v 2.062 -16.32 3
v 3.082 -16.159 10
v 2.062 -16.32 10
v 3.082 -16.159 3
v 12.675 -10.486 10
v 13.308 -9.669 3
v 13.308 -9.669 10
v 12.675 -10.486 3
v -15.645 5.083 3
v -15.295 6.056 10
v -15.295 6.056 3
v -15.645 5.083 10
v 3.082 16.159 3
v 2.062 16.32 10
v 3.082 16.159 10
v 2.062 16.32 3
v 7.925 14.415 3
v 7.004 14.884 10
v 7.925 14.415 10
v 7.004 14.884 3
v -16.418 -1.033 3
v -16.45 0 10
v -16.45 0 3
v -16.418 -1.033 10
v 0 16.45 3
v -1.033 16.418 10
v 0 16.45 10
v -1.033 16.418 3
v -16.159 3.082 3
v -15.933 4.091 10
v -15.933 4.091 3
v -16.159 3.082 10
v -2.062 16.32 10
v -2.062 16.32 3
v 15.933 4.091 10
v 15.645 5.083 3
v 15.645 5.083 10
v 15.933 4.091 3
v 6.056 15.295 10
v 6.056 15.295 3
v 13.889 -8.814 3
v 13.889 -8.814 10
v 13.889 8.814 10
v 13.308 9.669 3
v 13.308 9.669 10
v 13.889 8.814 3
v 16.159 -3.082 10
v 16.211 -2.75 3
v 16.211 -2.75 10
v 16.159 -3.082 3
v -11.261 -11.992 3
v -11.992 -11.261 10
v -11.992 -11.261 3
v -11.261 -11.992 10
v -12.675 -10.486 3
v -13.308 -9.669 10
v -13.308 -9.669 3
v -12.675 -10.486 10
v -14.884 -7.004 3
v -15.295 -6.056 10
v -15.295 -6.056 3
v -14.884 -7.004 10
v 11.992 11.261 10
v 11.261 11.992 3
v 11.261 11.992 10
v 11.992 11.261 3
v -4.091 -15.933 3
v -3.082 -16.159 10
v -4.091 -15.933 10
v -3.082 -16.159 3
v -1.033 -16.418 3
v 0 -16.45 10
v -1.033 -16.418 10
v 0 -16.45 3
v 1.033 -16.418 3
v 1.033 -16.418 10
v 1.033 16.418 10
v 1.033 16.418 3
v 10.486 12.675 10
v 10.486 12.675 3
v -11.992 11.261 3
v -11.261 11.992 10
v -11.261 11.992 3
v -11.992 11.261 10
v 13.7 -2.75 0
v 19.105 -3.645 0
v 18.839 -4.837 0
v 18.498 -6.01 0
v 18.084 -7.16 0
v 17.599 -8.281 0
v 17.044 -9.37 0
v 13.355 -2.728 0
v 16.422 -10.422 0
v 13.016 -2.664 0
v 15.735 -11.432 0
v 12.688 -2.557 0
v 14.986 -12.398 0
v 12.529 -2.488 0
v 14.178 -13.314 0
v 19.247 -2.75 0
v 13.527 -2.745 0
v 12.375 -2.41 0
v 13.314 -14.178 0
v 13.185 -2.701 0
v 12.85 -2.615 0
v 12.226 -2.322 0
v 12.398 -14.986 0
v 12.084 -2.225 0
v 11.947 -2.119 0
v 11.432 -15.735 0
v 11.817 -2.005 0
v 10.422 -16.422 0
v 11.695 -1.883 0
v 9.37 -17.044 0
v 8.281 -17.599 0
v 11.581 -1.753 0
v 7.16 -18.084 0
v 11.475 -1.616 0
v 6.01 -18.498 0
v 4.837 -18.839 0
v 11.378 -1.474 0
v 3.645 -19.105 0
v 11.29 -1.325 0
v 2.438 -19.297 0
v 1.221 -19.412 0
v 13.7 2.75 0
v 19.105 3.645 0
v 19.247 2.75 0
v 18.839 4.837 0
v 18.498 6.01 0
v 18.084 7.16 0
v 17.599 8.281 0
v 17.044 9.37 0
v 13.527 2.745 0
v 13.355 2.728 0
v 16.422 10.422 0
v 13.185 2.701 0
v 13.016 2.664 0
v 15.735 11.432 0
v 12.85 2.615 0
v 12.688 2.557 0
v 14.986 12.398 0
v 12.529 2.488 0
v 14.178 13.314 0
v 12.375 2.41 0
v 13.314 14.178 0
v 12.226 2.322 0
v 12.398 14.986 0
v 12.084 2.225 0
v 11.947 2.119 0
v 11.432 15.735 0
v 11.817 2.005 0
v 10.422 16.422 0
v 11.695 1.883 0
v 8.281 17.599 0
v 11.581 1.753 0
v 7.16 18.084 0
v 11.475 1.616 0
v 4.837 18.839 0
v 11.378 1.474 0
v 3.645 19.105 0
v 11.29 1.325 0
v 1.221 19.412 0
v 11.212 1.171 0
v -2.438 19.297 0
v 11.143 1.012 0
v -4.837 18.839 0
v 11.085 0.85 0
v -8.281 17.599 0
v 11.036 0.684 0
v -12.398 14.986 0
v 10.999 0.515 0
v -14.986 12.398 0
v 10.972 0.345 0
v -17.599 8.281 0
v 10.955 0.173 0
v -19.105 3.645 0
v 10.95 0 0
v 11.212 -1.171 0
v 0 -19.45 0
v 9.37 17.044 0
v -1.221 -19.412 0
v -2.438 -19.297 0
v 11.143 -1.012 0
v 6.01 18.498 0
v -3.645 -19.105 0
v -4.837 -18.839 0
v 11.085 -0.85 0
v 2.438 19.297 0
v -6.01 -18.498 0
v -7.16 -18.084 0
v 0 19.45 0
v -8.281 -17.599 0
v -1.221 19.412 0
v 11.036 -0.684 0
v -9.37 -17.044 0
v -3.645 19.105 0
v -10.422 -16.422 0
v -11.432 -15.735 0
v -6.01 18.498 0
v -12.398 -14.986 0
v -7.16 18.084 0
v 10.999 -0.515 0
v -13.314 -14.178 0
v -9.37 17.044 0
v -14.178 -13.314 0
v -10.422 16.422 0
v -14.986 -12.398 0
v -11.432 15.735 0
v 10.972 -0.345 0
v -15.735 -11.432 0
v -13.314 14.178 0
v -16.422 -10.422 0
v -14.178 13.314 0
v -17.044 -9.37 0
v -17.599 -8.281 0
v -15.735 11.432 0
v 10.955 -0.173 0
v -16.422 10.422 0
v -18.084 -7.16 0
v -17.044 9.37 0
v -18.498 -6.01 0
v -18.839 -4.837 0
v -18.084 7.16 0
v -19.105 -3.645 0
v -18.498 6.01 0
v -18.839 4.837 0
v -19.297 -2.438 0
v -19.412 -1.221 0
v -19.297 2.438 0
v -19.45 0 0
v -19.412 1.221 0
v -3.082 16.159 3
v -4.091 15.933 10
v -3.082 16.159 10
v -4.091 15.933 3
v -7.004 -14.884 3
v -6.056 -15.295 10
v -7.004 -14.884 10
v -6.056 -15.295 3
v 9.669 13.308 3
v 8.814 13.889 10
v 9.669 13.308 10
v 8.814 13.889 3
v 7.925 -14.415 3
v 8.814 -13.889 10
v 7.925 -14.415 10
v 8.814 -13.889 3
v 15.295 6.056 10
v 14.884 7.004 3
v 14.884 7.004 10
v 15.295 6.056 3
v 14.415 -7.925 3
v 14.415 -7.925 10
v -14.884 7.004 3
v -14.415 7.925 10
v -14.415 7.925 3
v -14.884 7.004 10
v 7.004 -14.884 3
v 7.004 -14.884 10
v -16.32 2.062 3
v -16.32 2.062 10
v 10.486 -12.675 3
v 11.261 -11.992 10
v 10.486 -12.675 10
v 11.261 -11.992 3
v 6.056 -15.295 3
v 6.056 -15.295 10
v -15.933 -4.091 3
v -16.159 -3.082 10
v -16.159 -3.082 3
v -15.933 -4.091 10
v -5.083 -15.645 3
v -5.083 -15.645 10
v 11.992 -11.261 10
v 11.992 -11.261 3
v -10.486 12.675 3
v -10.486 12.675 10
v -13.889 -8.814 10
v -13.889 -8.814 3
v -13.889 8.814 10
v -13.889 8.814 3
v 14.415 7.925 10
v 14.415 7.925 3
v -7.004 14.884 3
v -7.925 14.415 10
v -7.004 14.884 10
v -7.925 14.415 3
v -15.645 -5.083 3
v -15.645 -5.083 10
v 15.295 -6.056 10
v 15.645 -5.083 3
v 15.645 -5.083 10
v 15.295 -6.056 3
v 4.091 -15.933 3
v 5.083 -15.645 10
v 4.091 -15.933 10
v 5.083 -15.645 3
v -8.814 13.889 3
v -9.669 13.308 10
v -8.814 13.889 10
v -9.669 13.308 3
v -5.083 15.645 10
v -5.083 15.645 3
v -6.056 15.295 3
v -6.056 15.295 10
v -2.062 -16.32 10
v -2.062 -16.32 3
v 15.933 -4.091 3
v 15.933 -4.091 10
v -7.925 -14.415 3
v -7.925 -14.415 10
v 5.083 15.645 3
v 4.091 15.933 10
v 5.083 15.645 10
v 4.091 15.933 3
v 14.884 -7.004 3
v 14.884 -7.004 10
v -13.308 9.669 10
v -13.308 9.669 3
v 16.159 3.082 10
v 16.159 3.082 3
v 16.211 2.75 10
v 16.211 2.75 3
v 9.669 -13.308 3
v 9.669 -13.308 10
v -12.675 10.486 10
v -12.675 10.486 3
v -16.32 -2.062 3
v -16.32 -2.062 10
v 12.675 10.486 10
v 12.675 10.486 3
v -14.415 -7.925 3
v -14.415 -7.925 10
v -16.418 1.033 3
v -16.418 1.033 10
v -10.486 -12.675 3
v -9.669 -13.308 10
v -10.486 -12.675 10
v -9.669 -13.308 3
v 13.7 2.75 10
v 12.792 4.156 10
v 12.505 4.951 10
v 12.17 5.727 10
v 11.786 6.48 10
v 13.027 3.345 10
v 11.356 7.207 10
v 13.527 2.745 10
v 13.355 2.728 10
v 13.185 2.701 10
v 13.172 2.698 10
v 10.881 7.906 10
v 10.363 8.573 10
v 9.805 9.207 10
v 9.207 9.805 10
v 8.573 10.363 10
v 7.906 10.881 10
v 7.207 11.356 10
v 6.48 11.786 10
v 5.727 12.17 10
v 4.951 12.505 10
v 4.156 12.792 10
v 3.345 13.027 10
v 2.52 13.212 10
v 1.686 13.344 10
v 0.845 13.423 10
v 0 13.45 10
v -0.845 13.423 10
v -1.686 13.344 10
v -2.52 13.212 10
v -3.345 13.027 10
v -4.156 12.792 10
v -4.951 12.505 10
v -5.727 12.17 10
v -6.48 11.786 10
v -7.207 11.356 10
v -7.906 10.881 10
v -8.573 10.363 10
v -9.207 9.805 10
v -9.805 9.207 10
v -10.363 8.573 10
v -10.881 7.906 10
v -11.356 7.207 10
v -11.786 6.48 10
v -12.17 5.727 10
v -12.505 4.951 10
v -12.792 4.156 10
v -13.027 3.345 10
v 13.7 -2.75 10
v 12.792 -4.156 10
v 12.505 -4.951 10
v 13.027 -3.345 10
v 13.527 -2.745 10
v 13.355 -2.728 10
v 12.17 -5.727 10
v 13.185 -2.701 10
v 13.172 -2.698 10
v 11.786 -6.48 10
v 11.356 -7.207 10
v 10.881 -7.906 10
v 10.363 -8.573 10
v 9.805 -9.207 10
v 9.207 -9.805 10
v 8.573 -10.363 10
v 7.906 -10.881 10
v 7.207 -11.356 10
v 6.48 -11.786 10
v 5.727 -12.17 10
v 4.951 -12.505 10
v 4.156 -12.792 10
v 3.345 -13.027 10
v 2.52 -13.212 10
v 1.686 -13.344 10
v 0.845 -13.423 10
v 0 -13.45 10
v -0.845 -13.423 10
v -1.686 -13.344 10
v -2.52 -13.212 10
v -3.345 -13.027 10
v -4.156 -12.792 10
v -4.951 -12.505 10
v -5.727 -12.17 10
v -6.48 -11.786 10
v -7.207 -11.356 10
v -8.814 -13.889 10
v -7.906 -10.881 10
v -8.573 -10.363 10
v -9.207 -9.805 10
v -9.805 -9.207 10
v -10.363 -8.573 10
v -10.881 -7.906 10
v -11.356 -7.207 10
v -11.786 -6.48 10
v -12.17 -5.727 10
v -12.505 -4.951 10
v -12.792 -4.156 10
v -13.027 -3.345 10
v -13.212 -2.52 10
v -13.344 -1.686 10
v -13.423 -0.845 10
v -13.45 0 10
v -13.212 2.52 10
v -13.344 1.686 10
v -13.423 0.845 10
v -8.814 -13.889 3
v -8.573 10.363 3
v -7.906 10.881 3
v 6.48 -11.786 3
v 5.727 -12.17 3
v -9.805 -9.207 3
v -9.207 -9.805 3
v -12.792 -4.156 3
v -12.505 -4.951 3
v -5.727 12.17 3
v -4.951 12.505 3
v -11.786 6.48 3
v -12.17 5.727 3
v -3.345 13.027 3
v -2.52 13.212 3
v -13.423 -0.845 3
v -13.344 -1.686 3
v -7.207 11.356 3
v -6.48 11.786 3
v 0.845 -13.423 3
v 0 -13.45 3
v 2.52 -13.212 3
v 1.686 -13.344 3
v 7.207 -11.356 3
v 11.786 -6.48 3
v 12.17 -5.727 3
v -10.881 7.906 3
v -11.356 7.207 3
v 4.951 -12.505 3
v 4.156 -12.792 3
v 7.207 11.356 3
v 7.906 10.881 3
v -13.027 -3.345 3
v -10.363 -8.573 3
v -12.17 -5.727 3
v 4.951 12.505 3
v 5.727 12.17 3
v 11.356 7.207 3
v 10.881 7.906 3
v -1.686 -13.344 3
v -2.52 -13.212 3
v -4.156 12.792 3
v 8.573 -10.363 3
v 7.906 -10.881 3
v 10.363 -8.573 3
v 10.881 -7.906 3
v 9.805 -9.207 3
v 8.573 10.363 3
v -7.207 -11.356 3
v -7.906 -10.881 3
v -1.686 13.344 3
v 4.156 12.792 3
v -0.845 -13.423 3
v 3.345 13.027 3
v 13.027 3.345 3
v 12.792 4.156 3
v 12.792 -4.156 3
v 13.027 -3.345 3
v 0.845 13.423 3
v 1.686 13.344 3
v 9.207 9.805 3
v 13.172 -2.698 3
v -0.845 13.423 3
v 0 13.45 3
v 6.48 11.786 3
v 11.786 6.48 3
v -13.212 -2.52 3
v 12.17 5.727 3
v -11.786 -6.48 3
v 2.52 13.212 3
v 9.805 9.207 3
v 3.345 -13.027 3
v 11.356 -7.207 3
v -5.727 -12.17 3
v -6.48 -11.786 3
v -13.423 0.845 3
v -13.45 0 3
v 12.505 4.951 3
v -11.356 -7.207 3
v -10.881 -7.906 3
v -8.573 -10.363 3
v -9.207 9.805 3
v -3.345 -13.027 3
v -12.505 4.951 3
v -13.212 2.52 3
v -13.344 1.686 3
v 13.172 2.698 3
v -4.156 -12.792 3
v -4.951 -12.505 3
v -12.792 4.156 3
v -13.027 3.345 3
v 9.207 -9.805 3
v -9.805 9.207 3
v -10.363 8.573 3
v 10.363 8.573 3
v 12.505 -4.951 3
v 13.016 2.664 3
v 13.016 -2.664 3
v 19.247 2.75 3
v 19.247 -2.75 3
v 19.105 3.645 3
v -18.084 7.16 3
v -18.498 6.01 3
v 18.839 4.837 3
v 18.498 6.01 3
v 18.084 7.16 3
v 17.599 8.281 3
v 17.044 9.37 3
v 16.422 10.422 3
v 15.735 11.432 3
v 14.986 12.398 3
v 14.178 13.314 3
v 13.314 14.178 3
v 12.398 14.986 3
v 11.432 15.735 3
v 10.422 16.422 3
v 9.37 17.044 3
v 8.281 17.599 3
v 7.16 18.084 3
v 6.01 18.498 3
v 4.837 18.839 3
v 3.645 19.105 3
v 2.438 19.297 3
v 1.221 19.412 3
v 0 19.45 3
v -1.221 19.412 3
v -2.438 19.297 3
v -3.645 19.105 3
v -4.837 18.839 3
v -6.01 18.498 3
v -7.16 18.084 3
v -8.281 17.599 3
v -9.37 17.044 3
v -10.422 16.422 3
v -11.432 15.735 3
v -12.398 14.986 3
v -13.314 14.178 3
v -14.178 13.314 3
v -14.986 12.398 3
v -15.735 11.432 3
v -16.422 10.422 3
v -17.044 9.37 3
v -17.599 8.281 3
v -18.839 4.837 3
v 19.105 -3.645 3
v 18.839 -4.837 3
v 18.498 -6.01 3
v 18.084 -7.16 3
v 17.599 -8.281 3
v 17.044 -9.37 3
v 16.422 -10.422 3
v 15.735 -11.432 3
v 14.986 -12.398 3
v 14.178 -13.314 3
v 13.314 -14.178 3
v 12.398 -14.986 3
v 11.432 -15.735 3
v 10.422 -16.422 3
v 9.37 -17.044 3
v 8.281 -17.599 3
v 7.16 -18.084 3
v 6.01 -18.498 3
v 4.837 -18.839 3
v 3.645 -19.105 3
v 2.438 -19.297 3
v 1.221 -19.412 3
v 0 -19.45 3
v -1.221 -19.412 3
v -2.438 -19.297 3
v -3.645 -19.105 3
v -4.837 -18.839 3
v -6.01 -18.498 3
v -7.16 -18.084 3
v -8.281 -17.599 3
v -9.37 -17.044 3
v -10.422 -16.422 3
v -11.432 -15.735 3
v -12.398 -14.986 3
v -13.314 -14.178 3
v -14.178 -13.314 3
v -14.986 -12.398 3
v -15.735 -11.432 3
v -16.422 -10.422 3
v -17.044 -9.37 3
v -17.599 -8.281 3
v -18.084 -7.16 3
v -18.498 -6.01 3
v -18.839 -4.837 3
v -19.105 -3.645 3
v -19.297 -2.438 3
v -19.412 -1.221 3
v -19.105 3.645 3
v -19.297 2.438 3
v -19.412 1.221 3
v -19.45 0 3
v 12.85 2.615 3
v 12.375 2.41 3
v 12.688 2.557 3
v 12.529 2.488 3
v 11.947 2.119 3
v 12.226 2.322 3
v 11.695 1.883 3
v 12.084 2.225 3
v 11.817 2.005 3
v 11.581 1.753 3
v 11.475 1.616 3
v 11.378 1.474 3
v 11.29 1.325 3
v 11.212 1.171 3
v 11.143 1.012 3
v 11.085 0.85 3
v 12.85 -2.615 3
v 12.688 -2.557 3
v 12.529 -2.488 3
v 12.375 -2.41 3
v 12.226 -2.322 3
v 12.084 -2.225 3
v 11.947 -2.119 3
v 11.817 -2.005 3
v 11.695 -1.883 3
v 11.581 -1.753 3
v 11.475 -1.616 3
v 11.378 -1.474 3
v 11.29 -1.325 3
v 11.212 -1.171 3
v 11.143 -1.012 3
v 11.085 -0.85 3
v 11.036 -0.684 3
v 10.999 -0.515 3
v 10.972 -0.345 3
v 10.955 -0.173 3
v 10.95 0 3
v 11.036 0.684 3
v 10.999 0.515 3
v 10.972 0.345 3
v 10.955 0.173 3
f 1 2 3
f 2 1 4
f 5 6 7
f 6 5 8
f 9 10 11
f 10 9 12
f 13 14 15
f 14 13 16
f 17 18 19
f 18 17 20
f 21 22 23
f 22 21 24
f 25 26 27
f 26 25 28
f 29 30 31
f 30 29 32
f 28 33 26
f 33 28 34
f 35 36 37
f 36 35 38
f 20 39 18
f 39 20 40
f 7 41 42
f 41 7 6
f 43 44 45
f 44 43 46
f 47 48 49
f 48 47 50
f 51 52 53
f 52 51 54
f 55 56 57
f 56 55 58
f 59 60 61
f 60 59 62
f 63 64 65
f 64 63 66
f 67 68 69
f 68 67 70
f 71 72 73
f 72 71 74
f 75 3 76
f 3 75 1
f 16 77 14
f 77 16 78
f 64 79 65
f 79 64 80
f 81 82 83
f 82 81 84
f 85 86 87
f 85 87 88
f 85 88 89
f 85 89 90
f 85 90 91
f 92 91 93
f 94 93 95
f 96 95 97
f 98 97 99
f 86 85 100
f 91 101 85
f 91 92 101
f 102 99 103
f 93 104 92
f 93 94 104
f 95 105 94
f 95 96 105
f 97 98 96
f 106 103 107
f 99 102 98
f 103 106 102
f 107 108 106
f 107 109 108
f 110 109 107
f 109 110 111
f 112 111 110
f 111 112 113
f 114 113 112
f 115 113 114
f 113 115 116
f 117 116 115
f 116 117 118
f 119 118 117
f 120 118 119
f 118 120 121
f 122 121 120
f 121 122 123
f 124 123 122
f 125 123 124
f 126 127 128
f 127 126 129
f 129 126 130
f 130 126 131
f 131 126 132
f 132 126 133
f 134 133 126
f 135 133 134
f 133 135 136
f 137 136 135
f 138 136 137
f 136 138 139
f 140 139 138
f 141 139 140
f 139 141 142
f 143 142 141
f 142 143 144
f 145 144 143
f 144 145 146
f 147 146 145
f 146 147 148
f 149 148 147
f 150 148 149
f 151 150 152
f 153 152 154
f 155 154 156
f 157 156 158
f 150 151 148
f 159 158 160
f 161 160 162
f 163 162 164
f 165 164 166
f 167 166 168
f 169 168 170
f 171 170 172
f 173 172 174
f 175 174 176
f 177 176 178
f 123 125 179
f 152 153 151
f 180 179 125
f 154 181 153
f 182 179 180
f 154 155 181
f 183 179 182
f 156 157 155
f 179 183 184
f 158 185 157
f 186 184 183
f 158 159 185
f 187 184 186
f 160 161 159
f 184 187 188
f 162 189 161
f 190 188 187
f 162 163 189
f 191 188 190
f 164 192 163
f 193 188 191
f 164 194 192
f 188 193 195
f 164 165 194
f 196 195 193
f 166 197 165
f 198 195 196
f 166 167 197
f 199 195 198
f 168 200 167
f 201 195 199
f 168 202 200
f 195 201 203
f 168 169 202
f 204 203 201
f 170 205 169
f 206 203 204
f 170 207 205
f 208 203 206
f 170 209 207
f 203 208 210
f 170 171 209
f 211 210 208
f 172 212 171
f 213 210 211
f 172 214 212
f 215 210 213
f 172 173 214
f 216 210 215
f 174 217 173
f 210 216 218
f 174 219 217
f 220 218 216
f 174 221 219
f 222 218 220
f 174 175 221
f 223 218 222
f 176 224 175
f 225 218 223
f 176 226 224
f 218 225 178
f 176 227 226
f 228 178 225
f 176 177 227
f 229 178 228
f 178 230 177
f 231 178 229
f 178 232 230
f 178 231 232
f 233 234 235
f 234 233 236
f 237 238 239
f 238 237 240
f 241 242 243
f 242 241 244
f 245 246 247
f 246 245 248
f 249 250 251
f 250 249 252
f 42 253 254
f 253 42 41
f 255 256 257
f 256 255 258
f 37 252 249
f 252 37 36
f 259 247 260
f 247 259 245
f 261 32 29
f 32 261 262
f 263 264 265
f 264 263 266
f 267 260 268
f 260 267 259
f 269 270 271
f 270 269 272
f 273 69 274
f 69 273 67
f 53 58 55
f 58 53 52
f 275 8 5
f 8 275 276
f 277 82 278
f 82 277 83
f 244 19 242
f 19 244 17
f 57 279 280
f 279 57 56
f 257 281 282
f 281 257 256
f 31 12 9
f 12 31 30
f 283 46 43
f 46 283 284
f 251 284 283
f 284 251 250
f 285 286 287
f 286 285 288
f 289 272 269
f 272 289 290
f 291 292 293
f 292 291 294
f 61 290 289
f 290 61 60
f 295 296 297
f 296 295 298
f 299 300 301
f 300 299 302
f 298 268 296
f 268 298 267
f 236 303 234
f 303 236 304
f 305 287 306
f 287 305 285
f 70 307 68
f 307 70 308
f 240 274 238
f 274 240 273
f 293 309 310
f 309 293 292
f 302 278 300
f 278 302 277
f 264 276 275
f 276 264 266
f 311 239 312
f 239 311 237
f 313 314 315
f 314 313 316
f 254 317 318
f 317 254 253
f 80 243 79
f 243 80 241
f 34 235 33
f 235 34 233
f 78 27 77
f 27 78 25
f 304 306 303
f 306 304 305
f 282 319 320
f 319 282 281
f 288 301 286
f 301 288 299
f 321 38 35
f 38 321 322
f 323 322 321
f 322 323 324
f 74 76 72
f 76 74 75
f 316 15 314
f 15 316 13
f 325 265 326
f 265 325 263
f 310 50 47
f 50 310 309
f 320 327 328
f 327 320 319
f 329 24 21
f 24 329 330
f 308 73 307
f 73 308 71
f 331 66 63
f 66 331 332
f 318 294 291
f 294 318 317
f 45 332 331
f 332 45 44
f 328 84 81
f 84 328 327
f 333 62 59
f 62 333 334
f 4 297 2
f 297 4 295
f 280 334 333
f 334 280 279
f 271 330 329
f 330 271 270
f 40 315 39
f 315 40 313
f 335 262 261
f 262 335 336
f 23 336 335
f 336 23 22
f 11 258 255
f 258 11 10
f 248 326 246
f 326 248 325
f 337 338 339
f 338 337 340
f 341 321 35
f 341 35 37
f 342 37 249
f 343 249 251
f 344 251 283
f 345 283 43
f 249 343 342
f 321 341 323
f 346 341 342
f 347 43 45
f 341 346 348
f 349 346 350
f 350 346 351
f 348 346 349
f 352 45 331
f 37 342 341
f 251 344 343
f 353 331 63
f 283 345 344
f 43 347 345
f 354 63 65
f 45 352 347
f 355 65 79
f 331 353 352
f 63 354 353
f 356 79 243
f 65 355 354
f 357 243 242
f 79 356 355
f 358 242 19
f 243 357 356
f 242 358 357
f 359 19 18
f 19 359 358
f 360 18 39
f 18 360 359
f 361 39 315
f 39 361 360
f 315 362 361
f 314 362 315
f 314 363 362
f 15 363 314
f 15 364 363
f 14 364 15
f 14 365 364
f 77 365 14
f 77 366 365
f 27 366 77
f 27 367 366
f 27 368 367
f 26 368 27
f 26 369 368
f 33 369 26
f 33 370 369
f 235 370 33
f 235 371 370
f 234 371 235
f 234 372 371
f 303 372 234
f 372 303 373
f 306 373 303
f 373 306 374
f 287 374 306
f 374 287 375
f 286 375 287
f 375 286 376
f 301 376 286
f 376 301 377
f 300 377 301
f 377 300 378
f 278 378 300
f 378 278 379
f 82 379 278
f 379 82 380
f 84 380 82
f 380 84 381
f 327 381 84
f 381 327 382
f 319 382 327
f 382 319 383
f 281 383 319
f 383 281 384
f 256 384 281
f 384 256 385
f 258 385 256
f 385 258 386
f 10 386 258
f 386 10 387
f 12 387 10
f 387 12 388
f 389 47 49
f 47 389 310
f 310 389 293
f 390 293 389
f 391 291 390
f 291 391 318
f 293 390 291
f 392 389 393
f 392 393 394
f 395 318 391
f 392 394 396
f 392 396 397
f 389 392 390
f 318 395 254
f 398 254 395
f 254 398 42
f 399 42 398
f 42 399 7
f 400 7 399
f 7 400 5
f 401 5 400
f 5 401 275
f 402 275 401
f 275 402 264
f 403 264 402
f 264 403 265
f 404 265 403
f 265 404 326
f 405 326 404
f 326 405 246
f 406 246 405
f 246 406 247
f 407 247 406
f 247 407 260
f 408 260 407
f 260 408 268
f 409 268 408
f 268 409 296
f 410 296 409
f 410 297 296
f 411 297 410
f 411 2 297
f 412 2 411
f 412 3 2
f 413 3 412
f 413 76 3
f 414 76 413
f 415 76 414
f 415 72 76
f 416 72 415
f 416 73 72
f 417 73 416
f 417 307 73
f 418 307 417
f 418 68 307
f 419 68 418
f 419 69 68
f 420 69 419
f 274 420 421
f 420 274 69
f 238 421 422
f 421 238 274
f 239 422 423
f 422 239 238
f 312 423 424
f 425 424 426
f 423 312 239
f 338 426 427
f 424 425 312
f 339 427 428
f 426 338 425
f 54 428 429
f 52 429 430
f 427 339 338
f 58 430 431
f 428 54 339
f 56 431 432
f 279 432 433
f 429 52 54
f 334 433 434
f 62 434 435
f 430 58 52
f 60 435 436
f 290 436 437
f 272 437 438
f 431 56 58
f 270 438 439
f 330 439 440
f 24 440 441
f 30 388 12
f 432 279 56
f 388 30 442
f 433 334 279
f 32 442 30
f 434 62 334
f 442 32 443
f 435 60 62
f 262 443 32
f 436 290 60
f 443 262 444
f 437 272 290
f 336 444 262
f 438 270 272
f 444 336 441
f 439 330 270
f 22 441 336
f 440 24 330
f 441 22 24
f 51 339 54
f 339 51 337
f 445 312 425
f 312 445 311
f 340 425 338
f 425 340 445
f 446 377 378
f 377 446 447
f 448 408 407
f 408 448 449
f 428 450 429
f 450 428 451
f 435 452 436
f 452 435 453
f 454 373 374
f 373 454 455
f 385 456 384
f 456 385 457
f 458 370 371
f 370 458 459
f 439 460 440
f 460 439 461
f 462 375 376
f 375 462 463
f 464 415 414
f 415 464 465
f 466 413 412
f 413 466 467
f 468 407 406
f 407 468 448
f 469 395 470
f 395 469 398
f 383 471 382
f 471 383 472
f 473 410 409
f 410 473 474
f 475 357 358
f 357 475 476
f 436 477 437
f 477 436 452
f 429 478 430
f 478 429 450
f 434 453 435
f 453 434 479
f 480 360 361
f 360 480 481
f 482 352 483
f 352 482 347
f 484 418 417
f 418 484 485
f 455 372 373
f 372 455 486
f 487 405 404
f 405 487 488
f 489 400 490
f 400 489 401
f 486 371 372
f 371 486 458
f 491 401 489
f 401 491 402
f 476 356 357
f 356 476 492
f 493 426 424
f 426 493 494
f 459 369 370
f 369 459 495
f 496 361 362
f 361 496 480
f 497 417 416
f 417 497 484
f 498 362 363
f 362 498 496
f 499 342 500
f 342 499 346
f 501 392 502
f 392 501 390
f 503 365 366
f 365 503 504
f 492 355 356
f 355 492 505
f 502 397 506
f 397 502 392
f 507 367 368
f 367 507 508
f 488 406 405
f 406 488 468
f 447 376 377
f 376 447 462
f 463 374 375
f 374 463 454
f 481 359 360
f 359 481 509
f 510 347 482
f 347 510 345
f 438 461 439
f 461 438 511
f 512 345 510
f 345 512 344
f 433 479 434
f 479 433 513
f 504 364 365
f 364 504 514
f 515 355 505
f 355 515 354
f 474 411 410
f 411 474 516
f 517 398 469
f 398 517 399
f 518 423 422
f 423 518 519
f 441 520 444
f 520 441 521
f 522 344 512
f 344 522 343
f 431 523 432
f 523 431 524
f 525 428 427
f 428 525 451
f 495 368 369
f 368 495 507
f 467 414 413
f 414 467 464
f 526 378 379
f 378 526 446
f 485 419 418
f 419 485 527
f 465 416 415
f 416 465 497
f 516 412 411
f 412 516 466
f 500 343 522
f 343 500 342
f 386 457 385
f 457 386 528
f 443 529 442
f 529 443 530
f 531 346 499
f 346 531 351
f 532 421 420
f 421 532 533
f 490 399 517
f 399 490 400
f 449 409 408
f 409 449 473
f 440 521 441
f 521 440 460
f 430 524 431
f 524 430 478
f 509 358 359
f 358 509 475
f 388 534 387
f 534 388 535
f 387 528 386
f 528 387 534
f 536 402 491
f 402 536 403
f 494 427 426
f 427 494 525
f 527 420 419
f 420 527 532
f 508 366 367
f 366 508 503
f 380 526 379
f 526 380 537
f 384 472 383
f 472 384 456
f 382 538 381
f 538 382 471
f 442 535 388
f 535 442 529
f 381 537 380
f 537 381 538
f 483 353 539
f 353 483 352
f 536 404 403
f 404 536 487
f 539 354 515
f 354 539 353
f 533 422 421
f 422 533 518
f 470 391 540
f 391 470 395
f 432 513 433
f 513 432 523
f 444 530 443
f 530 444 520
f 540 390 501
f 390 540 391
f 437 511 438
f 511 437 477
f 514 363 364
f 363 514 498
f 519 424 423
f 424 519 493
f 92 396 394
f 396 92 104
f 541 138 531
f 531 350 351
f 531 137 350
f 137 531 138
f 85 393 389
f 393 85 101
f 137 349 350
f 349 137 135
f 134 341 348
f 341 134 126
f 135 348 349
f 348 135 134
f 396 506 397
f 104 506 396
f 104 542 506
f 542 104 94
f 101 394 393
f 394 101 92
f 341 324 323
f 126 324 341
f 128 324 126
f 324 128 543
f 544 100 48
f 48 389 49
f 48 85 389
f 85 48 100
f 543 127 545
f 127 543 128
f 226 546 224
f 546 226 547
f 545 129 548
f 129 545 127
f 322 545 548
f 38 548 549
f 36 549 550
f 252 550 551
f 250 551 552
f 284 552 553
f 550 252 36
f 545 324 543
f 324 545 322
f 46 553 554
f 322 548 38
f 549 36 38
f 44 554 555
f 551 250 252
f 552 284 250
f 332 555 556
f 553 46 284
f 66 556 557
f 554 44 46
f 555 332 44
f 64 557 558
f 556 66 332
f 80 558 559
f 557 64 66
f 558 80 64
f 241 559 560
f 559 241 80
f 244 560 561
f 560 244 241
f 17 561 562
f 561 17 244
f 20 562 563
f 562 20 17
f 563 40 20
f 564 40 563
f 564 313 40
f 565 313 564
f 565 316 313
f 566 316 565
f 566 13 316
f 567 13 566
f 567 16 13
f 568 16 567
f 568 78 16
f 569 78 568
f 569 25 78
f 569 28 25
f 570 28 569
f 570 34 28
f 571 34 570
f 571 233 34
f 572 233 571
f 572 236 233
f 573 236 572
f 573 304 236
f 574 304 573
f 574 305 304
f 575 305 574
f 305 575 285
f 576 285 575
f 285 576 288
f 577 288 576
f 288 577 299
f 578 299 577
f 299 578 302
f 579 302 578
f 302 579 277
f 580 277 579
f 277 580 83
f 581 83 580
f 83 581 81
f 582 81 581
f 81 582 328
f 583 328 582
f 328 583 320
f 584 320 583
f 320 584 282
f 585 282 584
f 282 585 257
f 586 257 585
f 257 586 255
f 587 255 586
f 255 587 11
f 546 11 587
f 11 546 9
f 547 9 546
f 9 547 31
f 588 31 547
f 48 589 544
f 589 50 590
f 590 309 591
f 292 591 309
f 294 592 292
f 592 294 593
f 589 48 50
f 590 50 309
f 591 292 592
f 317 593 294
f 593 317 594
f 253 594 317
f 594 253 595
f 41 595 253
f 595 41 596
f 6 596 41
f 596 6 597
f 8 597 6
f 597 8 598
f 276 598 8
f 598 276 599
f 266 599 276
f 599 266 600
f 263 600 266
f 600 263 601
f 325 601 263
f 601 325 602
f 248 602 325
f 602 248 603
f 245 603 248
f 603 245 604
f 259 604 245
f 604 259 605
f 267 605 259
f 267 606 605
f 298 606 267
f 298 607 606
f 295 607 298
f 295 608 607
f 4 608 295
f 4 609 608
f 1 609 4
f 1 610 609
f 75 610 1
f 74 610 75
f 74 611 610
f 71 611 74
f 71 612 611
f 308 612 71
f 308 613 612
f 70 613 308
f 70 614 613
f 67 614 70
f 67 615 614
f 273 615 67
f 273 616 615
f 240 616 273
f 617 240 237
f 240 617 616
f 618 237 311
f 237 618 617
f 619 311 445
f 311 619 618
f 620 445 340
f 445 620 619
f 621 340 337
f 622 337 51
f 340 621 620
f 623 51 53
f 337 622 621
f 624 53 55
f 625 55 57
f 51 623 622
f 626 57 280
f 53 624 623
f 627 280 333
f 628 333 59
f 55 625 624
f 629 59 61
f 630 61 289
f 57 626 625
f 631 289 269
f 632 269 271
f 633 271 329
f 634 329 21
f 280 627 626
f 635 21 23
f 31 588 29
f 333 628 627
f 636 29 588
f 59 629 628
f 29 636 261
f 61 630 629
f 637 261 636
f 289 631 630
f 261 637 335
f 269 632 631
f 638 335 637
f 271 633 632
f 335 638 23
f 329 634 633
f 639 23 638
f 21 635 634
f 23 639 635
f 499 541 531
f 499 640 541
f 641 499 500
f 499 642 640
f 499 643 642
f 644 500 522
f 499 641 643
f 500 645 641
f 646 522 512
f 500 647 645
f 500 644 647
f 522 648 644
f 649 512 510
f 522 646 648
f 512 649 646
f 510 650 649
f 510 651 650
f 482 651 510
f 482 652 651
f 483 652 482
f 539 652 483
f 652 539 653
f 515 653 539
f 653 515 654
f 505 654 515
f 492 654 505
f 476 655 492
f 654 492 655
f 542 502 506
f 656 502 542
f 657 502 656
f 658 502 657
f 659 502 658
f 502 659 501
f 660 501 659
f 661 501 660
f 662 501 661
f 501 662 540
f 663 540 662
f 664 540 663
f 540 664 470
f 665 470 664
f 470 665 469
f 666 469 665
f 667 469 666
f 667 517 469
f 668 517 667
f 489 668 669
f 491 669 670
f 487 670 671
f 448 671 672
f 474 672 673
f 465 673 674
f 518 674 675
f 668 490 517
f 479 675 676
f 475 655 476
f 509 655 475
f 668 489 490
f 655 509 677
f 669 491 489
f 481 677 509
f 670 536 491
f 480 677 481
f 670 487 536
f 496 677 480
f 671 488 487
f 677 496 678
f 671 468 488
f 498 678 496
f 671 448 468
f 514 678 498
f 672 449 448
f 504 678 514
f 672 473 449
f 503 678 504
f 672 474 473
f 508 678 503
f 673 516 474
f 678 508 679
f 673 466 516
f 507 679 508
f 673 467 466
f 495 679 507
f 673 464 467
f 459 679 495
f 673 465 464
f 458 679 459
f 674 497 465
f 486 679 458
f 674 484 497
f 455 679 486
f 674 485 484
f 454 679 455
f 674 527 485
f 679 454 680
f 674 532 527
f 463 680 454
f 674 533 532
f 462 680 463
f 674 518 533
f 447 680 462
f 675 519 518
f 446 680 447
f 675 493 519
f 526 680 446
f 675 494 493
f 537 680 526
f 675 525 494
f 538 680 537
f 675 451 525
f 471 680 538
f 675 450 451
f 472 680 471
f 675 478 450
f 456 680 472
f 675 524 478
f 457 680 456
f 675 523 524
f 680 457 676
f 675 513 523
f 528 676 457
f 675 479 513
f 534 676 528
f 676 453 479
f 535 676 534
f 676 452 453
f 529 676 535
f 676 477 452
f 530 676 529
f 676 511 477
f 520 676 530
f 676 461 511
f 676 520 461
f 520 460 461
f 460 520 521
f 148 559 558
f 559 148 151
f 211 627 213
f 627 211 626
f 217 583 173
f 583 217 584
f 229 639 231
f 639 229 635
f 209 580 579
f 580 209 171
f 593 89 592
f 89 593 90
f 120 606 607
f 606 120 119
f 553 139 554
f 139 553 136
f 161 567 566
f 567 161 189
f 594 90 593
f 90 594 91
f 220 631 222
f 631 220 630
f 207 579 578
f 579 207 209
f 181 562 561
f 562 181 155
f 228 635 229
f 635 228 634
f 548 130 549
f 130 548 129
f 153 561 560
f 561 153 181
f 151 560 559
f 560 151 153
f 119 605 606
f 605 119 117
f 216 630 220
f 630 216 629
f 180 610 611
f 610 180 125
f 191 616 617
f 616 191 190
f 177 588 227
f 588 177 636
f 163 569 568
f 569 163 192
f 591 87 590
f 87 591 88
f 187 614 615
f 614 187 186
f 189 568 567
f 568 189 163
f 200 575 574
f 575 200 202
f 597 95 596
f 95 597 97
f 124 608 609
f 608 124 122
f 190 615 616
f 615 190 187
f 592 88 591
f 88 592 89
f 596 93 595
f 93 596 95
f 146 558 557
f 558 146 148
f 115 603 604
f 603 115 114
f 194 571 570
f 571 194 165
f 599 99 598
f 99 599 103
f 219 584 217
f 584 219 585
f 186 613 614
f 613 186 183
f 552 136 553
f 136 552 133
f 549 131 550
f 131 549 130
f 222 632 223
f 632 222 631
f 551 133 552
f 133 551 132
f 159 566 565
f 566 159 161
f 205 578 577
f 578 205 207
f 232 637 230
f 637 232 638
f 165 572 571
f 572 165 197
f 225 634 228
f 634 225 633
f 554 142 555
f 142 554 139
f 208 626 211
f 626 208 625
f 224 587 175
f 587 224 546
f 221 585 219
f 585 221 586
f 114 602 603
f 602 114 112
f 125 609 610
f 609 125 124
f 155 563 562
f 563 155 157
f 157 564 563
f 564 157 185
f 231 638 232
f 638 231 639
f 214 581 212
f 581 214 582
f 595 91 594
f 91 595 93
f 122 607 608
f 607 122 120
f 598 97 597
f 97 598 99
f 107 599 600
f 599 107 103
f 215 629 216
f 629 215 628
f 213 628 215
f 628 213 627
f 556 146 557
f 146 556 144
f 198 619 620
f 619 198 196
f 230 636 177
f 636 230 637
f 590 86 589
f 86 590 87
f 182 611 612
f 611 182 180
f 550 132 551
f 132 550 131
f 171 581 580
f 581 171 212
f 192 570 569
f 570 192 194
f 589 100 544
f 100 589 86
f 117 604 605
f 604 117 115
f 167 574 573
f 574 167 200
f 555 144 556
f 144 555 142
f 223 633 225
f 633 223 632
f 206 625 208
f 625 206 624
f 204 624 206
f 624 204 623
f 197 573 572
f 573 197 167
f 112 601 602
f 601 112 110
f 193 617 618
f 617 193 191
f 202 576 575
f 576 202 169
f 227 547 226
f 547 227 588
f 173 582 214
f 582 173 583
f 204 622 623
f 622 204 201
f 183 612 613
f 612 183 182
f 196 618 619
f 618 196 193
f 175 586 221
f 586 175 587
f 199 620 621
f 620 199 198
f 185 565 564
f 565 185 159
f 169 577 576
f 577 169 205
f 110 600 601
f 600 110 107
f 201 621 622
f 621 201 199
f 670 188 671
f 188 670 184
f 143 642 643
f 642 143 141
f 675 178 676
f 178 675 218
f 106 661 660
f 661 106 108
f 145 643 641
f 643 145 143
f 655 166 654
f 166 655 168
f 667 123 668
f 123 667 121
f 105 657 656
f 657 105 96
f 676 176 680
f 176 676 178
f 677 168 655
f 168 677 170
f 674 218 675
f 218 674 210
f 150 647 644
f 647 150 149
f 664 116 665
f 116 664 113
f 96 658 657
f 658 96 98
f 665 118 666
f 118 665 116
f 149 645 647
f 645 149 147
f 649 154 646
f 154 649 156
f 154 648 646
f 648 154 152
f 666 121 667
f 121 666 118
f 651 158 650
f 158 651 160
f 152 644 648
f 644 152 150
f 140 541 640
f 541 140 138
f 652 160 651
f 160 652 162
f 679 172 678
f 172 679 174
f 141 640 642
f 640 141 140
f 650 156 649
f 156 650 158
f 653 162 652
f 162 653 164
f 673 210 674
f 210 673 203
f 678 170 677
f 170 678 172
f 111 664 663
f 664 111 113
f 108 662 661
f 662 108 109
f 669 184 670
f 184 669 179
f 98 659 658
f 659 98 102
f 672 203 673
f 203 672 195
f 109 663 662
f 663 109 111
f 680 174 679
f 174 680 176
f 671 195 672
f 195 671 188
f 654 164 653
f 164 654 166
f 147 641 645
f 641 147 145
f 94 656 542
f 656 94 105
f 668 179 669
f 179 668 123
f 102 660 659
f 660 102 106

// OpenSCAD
// modular cable inlet plug
// adjust PR and CR to fit different fittings or pipe


//parameters
$fn=100;

PR=16.45;   //enter pvc pipe radius here (for standard 1" PVC, PR=16.90)
CR= 2.75;   //cable radius (voltaic CR=2.7)
    
// main body (ring) with cable pass-through    
difference(){
    cylinder(10,PR,PR); 
    cylinder(12,PR-3,PR-3);
    translate([PR-CR,0,-2]) cylinder(25,CR,CR);
    translate([PR-CR,-CR,-2])cube([13,CR*2,25]);
    }
    
// flange with same pass-through
difference(){
    cylinder(3,PR+3,PR+3); 
    translate([PR-CR,0,-2]) cylinder(25,CR,CR);
    translate([PR-CR,-CR,-2])cube([13,CR*2,25]);
    }
